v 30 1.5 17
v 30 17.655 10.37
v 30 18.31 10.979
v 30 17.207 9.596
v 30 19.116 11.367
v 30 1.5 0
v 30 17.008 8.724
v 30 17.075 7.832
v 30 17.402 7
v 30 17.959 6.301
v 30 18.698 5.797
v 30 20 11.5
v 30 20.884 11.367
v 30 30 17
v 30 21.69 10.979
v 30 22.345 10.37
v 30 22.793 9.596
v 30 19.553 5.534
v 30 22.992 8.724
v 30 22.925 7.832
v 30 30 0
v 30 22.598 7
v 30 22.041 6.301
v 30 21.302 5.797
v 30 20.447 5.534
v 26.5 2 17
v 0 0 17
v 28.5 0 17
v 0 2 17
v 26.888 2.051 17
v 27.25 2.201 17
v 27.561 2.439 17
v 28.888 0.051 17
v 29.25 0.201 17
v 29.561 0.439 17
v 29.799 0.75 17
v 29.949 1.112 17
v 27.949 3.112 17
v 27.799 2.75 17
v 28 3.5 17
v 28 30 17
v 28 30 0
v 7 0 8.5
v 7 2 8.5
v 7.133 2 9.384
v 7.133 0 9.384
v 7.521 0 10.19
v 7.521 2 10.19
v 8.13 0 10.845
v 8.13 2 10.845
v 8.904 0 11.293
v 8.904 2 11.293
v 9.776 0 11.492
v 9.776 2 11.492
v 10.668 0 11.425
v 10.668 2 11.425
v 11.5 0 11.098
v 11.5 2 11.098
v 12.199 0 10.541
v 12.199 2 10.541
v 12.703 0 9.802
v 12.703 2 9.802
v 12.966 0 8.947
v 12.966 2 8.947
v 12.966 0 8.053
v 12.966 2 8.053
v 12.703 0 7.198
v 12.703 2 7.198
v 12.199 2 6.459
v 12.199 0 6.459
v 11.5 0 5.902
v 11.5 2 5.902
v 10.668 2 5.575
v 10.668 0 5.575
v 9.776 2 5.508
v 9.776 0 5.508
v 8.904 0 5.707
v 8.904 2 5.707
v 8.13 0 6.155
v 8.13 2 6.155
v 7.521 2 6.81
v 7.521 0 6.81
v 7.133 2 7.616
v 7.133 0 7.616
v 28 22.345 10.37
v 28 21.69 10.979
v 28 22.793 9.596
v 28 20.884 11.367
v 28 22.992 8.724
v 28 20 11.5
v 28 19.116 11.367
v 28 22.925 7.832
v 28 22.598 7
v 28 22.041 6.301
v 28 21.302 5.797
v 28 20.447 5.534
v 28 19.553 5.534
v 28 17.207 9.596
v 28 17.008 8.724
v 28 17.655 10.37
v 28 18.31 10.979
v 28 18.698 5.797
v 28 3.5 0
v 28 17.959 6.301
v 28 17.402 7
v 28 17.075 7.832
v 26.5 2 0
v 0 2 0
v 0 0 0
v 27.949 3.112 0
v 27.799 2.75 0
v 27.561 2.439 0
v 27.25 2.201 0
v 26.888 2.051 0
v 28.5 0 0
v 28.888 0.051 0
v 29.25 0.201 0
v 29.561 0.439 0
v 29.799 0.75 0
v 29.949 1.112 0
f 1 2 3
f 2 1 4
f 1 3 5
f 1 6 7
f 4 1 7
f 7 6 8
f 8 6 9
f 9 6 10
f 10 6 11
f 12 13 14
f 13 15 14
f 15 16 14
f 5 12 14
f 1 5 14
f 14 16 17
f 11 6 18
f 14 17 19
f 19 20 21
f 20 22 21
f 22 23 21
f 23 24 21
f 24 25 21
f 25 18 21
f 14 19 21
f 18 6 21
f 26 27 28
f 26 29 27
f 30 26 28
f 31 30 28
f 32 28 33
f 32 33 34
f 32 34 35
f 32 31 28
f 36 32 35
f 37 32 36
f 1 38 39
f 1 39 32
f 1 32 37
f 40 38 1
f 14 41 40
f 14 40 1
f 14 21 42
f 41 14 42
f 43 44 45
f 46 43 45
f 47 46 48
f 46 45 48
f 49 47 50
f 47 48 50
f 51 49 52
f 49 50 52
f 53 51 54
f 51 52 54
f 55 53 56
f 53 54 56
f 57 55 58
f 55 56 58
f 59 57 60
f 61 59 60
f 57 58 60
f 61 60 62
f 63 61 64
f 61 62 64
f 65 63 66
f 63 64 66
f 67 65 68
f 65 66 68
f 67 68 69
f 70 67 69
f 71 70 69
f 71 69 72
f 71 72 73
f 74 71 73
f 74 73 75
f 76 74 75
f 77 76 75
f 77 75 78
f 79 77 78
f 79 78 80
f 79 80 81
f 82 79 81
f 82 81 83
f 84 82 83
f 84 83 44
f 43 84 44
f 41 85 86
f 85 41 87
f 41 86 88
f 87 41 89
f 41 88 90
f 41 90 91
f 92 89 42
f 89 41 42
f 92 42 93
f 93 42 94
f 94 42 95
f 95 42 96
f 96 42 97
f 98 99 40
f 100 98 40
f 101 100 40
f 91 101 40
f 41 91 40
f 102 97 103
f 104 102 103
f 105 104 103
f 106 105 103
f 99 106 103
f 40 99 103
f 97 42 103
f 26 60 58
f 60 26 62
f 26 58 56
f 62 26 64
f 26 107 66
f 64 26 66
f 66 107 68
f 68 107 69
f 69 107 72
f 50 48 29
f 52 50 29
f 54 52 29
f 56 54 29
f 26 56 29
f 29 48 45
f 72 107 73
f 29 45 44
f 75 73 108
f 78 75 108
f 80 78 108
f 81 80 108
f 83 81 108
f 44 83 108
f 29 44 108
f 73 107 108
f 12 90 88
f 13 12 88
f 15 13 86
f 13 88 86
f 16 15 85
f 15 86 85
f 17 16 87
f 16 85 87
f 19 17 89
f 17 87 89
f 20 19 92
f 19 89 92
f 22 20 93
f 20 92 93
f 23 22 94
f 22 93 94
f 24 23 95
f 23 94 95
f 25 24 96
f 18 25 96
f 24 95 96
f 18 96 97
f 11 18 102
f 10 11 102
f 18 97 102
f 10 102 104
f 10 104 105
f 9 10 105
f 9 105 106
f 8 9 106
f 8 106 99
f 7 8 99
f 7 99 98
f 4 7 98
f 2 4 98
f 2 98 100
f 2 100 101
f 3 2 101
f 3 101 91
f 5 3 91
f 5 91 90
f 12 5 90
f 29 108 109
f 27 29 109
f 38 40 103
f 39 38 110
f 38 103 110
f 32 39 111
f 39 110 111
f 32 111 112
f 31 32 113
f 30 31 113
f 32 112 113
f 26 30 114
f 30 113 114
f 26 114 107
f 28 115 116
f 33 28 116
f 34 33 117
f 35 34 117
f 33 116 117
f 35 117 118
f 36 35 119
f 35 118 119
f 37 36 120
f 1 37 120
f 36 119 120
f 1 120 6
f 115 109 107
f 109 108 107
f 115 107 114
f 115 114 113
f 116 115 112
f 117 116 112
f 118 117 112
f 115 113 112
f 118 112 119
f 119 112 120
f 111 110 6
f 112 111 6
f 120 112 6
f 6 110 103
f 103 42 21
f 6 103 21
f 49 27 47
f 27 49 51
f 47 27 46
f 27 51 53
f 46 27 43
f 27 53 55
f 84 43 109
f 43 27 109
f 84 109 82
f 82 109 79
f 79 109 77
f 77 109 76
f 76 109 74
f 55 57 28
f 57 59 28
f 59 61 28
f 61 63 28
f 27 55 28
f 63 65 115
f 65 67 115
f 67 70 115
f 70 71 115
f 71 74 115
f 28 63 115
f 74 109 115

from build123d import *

# Parameters (mm, degrees)
BOSS_EXTRUDE1_DEPTH = 17
SKETCH3_R           = 3
CUT_EXTRUDE1_DEPTH  = 45.418464629
SKETCH4_R           = 3
CUT_EXTRUDE2_DEPTH  = 45.418464629


with BuildPart() as part:
    # Sketch2 → Boss-Extrude1 (new body)
    with BuildSketch(Plane.XY):
        with BuildLine():
            Line((0, 0), (28.5, 0))
            ThreePointArc((28.5, 0), (29.560660172, 0.439339828), (30, 1.5))
            Line((30, 1.5), (30, 30))
            Line((30, 30), (28, 30))
            Line((28, 30), (28, 3.5))
            ThreePointArc((28, 3.5), (27.560660172, 2.439339828), (26.5, 2))
            Line((26.5, 2), (0, 2))
            Line((0, 2), (0, 0))
        make_face()
    extrude(amount=BOSS_EXTRUDE1_DEPTH)

    # Sketch3 → Cut-Extrude1 (cut, through all)
    with BuildSketch(Plane.ZY.offset(-28)):
        with Locations((8.5, 20)):
            Circle(SKETCH3_R)
    extrude(amount=-CUT_EXTRUDE1_DEPTH, mode=Mode.SUBTRACT)

    # Sketch4 → Cut-Extrude2 (cut, through all)
    with BuildSketch(Plane(origin=(0, 2, 0), x_dir=(1, 0, 0), z_dir=(0, 1, 0))):
        with Locations(Location((10, -8.5, 0), (0, 0, 180))):
            Circle(SKETCH4_R)
    extrude(amount=-CUT_EXTRUDE2_DEPTH, mode=Mode.SUBTRACT)


solid = part.part
